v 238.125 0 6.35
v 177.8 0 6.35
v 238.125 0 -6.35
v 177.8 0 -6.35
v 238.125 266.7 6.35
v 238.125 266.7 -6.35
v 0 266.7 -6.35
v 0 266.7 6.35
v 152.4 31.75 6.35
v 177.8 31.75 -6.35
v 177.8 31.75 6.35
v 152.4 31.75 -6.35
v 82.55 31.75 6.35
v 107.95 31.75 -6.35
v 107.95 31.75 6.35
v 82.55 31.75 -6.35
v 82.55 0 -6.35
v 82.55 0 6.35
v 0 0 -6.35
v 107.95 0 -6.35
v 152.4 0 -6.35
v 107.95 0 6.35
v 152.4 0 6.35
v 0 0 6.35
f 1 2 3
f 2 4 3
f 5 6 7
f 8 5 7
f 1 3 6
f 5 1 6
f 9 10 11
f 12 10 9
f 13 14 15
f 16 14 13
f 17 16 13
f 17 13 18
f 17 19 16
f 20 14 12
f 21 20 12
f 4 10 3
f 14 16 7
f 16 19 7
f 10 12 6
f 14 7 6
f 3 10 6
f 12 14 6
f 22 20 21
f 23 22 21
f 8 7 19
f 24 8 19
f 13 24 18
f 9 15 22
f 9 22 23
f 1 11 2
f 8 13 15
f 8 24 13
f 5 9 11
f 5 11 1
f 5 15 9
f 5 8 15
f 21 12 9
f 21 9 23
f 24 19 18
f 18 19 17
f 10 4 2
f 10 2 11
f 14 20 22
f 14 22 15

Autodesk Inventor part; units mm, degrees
ref_plane "YZ Plane" through (0, 0, 0) normal (1, 0, 0) x (0, 1, 0)
ref_plane "XZ Plane" through (0, 0, 0) normal (0, 1, 0) x (-1, 0, 0)
ref_plane "XY Plane" through (0, 0, 0) normal (0, 0, 1) x (1, 0, 0)
sketch "Sketch1" plane through (0, 0, 0) normal (0, 0, 1) x (1, 0, 0)
  point P0 (0, 0)
sketch "Sketch2" plane through (0, 0, 0) normal (0, 0, 1) x (1, 0, 0)
  line L0 (0, 0) -> (238.125, 0)
  line L1 (238.125, 0) -> (238.125, 266.7)
  line L2 (238.125, 266.7) -> (0, 266.7)
  line L3 (0, 266.7) -> (0, 0)
  line L4 (82.55, 0) -> (107.95, 0)
  line L5 (107.95, 0) -> (107.95, 31.75)
  line L6 (107.95, 31.75) -> (82.55, 31.75)
  line L7 (82.55, 31.75) -> (82.55, 0)
  line L8 (152.4, 0) -> (177.8, 0)
  line L9 (177.8, 0) -> (177.8, 31.75)
  line L10 (177.8, 31.75) -> (152.4, 31.75)
  line L11 (152.4, 31.75) -> (152.4, 0)
  line L12 (130.175, 266.7) -> (130.175, 0)
  dimension "Width" = 238.125
  dimension "d1" = 266.7
  dimension "d2" = 130.175
  dimension "d3" = 22.225
  dimension "d4" = 25.4
  dimension "d5" = 22.225
  dimension "d6" = 25.4
  dimension "d7" = 31.75
extrude "Extrusion1" add sketch "Sketch2" along normal mid plane 12.7 contours L3 L2 L12 L0 L5 L6 L7 | L2 L1 L0 L9 L10 L11 L12
equation "\"d1\" = Height + Thick"
equation "\"d8\" = Thick"
equation "\"Height\" = 254"
equation "\"Thick\" = 12.7"
properties part number "SideWall"
